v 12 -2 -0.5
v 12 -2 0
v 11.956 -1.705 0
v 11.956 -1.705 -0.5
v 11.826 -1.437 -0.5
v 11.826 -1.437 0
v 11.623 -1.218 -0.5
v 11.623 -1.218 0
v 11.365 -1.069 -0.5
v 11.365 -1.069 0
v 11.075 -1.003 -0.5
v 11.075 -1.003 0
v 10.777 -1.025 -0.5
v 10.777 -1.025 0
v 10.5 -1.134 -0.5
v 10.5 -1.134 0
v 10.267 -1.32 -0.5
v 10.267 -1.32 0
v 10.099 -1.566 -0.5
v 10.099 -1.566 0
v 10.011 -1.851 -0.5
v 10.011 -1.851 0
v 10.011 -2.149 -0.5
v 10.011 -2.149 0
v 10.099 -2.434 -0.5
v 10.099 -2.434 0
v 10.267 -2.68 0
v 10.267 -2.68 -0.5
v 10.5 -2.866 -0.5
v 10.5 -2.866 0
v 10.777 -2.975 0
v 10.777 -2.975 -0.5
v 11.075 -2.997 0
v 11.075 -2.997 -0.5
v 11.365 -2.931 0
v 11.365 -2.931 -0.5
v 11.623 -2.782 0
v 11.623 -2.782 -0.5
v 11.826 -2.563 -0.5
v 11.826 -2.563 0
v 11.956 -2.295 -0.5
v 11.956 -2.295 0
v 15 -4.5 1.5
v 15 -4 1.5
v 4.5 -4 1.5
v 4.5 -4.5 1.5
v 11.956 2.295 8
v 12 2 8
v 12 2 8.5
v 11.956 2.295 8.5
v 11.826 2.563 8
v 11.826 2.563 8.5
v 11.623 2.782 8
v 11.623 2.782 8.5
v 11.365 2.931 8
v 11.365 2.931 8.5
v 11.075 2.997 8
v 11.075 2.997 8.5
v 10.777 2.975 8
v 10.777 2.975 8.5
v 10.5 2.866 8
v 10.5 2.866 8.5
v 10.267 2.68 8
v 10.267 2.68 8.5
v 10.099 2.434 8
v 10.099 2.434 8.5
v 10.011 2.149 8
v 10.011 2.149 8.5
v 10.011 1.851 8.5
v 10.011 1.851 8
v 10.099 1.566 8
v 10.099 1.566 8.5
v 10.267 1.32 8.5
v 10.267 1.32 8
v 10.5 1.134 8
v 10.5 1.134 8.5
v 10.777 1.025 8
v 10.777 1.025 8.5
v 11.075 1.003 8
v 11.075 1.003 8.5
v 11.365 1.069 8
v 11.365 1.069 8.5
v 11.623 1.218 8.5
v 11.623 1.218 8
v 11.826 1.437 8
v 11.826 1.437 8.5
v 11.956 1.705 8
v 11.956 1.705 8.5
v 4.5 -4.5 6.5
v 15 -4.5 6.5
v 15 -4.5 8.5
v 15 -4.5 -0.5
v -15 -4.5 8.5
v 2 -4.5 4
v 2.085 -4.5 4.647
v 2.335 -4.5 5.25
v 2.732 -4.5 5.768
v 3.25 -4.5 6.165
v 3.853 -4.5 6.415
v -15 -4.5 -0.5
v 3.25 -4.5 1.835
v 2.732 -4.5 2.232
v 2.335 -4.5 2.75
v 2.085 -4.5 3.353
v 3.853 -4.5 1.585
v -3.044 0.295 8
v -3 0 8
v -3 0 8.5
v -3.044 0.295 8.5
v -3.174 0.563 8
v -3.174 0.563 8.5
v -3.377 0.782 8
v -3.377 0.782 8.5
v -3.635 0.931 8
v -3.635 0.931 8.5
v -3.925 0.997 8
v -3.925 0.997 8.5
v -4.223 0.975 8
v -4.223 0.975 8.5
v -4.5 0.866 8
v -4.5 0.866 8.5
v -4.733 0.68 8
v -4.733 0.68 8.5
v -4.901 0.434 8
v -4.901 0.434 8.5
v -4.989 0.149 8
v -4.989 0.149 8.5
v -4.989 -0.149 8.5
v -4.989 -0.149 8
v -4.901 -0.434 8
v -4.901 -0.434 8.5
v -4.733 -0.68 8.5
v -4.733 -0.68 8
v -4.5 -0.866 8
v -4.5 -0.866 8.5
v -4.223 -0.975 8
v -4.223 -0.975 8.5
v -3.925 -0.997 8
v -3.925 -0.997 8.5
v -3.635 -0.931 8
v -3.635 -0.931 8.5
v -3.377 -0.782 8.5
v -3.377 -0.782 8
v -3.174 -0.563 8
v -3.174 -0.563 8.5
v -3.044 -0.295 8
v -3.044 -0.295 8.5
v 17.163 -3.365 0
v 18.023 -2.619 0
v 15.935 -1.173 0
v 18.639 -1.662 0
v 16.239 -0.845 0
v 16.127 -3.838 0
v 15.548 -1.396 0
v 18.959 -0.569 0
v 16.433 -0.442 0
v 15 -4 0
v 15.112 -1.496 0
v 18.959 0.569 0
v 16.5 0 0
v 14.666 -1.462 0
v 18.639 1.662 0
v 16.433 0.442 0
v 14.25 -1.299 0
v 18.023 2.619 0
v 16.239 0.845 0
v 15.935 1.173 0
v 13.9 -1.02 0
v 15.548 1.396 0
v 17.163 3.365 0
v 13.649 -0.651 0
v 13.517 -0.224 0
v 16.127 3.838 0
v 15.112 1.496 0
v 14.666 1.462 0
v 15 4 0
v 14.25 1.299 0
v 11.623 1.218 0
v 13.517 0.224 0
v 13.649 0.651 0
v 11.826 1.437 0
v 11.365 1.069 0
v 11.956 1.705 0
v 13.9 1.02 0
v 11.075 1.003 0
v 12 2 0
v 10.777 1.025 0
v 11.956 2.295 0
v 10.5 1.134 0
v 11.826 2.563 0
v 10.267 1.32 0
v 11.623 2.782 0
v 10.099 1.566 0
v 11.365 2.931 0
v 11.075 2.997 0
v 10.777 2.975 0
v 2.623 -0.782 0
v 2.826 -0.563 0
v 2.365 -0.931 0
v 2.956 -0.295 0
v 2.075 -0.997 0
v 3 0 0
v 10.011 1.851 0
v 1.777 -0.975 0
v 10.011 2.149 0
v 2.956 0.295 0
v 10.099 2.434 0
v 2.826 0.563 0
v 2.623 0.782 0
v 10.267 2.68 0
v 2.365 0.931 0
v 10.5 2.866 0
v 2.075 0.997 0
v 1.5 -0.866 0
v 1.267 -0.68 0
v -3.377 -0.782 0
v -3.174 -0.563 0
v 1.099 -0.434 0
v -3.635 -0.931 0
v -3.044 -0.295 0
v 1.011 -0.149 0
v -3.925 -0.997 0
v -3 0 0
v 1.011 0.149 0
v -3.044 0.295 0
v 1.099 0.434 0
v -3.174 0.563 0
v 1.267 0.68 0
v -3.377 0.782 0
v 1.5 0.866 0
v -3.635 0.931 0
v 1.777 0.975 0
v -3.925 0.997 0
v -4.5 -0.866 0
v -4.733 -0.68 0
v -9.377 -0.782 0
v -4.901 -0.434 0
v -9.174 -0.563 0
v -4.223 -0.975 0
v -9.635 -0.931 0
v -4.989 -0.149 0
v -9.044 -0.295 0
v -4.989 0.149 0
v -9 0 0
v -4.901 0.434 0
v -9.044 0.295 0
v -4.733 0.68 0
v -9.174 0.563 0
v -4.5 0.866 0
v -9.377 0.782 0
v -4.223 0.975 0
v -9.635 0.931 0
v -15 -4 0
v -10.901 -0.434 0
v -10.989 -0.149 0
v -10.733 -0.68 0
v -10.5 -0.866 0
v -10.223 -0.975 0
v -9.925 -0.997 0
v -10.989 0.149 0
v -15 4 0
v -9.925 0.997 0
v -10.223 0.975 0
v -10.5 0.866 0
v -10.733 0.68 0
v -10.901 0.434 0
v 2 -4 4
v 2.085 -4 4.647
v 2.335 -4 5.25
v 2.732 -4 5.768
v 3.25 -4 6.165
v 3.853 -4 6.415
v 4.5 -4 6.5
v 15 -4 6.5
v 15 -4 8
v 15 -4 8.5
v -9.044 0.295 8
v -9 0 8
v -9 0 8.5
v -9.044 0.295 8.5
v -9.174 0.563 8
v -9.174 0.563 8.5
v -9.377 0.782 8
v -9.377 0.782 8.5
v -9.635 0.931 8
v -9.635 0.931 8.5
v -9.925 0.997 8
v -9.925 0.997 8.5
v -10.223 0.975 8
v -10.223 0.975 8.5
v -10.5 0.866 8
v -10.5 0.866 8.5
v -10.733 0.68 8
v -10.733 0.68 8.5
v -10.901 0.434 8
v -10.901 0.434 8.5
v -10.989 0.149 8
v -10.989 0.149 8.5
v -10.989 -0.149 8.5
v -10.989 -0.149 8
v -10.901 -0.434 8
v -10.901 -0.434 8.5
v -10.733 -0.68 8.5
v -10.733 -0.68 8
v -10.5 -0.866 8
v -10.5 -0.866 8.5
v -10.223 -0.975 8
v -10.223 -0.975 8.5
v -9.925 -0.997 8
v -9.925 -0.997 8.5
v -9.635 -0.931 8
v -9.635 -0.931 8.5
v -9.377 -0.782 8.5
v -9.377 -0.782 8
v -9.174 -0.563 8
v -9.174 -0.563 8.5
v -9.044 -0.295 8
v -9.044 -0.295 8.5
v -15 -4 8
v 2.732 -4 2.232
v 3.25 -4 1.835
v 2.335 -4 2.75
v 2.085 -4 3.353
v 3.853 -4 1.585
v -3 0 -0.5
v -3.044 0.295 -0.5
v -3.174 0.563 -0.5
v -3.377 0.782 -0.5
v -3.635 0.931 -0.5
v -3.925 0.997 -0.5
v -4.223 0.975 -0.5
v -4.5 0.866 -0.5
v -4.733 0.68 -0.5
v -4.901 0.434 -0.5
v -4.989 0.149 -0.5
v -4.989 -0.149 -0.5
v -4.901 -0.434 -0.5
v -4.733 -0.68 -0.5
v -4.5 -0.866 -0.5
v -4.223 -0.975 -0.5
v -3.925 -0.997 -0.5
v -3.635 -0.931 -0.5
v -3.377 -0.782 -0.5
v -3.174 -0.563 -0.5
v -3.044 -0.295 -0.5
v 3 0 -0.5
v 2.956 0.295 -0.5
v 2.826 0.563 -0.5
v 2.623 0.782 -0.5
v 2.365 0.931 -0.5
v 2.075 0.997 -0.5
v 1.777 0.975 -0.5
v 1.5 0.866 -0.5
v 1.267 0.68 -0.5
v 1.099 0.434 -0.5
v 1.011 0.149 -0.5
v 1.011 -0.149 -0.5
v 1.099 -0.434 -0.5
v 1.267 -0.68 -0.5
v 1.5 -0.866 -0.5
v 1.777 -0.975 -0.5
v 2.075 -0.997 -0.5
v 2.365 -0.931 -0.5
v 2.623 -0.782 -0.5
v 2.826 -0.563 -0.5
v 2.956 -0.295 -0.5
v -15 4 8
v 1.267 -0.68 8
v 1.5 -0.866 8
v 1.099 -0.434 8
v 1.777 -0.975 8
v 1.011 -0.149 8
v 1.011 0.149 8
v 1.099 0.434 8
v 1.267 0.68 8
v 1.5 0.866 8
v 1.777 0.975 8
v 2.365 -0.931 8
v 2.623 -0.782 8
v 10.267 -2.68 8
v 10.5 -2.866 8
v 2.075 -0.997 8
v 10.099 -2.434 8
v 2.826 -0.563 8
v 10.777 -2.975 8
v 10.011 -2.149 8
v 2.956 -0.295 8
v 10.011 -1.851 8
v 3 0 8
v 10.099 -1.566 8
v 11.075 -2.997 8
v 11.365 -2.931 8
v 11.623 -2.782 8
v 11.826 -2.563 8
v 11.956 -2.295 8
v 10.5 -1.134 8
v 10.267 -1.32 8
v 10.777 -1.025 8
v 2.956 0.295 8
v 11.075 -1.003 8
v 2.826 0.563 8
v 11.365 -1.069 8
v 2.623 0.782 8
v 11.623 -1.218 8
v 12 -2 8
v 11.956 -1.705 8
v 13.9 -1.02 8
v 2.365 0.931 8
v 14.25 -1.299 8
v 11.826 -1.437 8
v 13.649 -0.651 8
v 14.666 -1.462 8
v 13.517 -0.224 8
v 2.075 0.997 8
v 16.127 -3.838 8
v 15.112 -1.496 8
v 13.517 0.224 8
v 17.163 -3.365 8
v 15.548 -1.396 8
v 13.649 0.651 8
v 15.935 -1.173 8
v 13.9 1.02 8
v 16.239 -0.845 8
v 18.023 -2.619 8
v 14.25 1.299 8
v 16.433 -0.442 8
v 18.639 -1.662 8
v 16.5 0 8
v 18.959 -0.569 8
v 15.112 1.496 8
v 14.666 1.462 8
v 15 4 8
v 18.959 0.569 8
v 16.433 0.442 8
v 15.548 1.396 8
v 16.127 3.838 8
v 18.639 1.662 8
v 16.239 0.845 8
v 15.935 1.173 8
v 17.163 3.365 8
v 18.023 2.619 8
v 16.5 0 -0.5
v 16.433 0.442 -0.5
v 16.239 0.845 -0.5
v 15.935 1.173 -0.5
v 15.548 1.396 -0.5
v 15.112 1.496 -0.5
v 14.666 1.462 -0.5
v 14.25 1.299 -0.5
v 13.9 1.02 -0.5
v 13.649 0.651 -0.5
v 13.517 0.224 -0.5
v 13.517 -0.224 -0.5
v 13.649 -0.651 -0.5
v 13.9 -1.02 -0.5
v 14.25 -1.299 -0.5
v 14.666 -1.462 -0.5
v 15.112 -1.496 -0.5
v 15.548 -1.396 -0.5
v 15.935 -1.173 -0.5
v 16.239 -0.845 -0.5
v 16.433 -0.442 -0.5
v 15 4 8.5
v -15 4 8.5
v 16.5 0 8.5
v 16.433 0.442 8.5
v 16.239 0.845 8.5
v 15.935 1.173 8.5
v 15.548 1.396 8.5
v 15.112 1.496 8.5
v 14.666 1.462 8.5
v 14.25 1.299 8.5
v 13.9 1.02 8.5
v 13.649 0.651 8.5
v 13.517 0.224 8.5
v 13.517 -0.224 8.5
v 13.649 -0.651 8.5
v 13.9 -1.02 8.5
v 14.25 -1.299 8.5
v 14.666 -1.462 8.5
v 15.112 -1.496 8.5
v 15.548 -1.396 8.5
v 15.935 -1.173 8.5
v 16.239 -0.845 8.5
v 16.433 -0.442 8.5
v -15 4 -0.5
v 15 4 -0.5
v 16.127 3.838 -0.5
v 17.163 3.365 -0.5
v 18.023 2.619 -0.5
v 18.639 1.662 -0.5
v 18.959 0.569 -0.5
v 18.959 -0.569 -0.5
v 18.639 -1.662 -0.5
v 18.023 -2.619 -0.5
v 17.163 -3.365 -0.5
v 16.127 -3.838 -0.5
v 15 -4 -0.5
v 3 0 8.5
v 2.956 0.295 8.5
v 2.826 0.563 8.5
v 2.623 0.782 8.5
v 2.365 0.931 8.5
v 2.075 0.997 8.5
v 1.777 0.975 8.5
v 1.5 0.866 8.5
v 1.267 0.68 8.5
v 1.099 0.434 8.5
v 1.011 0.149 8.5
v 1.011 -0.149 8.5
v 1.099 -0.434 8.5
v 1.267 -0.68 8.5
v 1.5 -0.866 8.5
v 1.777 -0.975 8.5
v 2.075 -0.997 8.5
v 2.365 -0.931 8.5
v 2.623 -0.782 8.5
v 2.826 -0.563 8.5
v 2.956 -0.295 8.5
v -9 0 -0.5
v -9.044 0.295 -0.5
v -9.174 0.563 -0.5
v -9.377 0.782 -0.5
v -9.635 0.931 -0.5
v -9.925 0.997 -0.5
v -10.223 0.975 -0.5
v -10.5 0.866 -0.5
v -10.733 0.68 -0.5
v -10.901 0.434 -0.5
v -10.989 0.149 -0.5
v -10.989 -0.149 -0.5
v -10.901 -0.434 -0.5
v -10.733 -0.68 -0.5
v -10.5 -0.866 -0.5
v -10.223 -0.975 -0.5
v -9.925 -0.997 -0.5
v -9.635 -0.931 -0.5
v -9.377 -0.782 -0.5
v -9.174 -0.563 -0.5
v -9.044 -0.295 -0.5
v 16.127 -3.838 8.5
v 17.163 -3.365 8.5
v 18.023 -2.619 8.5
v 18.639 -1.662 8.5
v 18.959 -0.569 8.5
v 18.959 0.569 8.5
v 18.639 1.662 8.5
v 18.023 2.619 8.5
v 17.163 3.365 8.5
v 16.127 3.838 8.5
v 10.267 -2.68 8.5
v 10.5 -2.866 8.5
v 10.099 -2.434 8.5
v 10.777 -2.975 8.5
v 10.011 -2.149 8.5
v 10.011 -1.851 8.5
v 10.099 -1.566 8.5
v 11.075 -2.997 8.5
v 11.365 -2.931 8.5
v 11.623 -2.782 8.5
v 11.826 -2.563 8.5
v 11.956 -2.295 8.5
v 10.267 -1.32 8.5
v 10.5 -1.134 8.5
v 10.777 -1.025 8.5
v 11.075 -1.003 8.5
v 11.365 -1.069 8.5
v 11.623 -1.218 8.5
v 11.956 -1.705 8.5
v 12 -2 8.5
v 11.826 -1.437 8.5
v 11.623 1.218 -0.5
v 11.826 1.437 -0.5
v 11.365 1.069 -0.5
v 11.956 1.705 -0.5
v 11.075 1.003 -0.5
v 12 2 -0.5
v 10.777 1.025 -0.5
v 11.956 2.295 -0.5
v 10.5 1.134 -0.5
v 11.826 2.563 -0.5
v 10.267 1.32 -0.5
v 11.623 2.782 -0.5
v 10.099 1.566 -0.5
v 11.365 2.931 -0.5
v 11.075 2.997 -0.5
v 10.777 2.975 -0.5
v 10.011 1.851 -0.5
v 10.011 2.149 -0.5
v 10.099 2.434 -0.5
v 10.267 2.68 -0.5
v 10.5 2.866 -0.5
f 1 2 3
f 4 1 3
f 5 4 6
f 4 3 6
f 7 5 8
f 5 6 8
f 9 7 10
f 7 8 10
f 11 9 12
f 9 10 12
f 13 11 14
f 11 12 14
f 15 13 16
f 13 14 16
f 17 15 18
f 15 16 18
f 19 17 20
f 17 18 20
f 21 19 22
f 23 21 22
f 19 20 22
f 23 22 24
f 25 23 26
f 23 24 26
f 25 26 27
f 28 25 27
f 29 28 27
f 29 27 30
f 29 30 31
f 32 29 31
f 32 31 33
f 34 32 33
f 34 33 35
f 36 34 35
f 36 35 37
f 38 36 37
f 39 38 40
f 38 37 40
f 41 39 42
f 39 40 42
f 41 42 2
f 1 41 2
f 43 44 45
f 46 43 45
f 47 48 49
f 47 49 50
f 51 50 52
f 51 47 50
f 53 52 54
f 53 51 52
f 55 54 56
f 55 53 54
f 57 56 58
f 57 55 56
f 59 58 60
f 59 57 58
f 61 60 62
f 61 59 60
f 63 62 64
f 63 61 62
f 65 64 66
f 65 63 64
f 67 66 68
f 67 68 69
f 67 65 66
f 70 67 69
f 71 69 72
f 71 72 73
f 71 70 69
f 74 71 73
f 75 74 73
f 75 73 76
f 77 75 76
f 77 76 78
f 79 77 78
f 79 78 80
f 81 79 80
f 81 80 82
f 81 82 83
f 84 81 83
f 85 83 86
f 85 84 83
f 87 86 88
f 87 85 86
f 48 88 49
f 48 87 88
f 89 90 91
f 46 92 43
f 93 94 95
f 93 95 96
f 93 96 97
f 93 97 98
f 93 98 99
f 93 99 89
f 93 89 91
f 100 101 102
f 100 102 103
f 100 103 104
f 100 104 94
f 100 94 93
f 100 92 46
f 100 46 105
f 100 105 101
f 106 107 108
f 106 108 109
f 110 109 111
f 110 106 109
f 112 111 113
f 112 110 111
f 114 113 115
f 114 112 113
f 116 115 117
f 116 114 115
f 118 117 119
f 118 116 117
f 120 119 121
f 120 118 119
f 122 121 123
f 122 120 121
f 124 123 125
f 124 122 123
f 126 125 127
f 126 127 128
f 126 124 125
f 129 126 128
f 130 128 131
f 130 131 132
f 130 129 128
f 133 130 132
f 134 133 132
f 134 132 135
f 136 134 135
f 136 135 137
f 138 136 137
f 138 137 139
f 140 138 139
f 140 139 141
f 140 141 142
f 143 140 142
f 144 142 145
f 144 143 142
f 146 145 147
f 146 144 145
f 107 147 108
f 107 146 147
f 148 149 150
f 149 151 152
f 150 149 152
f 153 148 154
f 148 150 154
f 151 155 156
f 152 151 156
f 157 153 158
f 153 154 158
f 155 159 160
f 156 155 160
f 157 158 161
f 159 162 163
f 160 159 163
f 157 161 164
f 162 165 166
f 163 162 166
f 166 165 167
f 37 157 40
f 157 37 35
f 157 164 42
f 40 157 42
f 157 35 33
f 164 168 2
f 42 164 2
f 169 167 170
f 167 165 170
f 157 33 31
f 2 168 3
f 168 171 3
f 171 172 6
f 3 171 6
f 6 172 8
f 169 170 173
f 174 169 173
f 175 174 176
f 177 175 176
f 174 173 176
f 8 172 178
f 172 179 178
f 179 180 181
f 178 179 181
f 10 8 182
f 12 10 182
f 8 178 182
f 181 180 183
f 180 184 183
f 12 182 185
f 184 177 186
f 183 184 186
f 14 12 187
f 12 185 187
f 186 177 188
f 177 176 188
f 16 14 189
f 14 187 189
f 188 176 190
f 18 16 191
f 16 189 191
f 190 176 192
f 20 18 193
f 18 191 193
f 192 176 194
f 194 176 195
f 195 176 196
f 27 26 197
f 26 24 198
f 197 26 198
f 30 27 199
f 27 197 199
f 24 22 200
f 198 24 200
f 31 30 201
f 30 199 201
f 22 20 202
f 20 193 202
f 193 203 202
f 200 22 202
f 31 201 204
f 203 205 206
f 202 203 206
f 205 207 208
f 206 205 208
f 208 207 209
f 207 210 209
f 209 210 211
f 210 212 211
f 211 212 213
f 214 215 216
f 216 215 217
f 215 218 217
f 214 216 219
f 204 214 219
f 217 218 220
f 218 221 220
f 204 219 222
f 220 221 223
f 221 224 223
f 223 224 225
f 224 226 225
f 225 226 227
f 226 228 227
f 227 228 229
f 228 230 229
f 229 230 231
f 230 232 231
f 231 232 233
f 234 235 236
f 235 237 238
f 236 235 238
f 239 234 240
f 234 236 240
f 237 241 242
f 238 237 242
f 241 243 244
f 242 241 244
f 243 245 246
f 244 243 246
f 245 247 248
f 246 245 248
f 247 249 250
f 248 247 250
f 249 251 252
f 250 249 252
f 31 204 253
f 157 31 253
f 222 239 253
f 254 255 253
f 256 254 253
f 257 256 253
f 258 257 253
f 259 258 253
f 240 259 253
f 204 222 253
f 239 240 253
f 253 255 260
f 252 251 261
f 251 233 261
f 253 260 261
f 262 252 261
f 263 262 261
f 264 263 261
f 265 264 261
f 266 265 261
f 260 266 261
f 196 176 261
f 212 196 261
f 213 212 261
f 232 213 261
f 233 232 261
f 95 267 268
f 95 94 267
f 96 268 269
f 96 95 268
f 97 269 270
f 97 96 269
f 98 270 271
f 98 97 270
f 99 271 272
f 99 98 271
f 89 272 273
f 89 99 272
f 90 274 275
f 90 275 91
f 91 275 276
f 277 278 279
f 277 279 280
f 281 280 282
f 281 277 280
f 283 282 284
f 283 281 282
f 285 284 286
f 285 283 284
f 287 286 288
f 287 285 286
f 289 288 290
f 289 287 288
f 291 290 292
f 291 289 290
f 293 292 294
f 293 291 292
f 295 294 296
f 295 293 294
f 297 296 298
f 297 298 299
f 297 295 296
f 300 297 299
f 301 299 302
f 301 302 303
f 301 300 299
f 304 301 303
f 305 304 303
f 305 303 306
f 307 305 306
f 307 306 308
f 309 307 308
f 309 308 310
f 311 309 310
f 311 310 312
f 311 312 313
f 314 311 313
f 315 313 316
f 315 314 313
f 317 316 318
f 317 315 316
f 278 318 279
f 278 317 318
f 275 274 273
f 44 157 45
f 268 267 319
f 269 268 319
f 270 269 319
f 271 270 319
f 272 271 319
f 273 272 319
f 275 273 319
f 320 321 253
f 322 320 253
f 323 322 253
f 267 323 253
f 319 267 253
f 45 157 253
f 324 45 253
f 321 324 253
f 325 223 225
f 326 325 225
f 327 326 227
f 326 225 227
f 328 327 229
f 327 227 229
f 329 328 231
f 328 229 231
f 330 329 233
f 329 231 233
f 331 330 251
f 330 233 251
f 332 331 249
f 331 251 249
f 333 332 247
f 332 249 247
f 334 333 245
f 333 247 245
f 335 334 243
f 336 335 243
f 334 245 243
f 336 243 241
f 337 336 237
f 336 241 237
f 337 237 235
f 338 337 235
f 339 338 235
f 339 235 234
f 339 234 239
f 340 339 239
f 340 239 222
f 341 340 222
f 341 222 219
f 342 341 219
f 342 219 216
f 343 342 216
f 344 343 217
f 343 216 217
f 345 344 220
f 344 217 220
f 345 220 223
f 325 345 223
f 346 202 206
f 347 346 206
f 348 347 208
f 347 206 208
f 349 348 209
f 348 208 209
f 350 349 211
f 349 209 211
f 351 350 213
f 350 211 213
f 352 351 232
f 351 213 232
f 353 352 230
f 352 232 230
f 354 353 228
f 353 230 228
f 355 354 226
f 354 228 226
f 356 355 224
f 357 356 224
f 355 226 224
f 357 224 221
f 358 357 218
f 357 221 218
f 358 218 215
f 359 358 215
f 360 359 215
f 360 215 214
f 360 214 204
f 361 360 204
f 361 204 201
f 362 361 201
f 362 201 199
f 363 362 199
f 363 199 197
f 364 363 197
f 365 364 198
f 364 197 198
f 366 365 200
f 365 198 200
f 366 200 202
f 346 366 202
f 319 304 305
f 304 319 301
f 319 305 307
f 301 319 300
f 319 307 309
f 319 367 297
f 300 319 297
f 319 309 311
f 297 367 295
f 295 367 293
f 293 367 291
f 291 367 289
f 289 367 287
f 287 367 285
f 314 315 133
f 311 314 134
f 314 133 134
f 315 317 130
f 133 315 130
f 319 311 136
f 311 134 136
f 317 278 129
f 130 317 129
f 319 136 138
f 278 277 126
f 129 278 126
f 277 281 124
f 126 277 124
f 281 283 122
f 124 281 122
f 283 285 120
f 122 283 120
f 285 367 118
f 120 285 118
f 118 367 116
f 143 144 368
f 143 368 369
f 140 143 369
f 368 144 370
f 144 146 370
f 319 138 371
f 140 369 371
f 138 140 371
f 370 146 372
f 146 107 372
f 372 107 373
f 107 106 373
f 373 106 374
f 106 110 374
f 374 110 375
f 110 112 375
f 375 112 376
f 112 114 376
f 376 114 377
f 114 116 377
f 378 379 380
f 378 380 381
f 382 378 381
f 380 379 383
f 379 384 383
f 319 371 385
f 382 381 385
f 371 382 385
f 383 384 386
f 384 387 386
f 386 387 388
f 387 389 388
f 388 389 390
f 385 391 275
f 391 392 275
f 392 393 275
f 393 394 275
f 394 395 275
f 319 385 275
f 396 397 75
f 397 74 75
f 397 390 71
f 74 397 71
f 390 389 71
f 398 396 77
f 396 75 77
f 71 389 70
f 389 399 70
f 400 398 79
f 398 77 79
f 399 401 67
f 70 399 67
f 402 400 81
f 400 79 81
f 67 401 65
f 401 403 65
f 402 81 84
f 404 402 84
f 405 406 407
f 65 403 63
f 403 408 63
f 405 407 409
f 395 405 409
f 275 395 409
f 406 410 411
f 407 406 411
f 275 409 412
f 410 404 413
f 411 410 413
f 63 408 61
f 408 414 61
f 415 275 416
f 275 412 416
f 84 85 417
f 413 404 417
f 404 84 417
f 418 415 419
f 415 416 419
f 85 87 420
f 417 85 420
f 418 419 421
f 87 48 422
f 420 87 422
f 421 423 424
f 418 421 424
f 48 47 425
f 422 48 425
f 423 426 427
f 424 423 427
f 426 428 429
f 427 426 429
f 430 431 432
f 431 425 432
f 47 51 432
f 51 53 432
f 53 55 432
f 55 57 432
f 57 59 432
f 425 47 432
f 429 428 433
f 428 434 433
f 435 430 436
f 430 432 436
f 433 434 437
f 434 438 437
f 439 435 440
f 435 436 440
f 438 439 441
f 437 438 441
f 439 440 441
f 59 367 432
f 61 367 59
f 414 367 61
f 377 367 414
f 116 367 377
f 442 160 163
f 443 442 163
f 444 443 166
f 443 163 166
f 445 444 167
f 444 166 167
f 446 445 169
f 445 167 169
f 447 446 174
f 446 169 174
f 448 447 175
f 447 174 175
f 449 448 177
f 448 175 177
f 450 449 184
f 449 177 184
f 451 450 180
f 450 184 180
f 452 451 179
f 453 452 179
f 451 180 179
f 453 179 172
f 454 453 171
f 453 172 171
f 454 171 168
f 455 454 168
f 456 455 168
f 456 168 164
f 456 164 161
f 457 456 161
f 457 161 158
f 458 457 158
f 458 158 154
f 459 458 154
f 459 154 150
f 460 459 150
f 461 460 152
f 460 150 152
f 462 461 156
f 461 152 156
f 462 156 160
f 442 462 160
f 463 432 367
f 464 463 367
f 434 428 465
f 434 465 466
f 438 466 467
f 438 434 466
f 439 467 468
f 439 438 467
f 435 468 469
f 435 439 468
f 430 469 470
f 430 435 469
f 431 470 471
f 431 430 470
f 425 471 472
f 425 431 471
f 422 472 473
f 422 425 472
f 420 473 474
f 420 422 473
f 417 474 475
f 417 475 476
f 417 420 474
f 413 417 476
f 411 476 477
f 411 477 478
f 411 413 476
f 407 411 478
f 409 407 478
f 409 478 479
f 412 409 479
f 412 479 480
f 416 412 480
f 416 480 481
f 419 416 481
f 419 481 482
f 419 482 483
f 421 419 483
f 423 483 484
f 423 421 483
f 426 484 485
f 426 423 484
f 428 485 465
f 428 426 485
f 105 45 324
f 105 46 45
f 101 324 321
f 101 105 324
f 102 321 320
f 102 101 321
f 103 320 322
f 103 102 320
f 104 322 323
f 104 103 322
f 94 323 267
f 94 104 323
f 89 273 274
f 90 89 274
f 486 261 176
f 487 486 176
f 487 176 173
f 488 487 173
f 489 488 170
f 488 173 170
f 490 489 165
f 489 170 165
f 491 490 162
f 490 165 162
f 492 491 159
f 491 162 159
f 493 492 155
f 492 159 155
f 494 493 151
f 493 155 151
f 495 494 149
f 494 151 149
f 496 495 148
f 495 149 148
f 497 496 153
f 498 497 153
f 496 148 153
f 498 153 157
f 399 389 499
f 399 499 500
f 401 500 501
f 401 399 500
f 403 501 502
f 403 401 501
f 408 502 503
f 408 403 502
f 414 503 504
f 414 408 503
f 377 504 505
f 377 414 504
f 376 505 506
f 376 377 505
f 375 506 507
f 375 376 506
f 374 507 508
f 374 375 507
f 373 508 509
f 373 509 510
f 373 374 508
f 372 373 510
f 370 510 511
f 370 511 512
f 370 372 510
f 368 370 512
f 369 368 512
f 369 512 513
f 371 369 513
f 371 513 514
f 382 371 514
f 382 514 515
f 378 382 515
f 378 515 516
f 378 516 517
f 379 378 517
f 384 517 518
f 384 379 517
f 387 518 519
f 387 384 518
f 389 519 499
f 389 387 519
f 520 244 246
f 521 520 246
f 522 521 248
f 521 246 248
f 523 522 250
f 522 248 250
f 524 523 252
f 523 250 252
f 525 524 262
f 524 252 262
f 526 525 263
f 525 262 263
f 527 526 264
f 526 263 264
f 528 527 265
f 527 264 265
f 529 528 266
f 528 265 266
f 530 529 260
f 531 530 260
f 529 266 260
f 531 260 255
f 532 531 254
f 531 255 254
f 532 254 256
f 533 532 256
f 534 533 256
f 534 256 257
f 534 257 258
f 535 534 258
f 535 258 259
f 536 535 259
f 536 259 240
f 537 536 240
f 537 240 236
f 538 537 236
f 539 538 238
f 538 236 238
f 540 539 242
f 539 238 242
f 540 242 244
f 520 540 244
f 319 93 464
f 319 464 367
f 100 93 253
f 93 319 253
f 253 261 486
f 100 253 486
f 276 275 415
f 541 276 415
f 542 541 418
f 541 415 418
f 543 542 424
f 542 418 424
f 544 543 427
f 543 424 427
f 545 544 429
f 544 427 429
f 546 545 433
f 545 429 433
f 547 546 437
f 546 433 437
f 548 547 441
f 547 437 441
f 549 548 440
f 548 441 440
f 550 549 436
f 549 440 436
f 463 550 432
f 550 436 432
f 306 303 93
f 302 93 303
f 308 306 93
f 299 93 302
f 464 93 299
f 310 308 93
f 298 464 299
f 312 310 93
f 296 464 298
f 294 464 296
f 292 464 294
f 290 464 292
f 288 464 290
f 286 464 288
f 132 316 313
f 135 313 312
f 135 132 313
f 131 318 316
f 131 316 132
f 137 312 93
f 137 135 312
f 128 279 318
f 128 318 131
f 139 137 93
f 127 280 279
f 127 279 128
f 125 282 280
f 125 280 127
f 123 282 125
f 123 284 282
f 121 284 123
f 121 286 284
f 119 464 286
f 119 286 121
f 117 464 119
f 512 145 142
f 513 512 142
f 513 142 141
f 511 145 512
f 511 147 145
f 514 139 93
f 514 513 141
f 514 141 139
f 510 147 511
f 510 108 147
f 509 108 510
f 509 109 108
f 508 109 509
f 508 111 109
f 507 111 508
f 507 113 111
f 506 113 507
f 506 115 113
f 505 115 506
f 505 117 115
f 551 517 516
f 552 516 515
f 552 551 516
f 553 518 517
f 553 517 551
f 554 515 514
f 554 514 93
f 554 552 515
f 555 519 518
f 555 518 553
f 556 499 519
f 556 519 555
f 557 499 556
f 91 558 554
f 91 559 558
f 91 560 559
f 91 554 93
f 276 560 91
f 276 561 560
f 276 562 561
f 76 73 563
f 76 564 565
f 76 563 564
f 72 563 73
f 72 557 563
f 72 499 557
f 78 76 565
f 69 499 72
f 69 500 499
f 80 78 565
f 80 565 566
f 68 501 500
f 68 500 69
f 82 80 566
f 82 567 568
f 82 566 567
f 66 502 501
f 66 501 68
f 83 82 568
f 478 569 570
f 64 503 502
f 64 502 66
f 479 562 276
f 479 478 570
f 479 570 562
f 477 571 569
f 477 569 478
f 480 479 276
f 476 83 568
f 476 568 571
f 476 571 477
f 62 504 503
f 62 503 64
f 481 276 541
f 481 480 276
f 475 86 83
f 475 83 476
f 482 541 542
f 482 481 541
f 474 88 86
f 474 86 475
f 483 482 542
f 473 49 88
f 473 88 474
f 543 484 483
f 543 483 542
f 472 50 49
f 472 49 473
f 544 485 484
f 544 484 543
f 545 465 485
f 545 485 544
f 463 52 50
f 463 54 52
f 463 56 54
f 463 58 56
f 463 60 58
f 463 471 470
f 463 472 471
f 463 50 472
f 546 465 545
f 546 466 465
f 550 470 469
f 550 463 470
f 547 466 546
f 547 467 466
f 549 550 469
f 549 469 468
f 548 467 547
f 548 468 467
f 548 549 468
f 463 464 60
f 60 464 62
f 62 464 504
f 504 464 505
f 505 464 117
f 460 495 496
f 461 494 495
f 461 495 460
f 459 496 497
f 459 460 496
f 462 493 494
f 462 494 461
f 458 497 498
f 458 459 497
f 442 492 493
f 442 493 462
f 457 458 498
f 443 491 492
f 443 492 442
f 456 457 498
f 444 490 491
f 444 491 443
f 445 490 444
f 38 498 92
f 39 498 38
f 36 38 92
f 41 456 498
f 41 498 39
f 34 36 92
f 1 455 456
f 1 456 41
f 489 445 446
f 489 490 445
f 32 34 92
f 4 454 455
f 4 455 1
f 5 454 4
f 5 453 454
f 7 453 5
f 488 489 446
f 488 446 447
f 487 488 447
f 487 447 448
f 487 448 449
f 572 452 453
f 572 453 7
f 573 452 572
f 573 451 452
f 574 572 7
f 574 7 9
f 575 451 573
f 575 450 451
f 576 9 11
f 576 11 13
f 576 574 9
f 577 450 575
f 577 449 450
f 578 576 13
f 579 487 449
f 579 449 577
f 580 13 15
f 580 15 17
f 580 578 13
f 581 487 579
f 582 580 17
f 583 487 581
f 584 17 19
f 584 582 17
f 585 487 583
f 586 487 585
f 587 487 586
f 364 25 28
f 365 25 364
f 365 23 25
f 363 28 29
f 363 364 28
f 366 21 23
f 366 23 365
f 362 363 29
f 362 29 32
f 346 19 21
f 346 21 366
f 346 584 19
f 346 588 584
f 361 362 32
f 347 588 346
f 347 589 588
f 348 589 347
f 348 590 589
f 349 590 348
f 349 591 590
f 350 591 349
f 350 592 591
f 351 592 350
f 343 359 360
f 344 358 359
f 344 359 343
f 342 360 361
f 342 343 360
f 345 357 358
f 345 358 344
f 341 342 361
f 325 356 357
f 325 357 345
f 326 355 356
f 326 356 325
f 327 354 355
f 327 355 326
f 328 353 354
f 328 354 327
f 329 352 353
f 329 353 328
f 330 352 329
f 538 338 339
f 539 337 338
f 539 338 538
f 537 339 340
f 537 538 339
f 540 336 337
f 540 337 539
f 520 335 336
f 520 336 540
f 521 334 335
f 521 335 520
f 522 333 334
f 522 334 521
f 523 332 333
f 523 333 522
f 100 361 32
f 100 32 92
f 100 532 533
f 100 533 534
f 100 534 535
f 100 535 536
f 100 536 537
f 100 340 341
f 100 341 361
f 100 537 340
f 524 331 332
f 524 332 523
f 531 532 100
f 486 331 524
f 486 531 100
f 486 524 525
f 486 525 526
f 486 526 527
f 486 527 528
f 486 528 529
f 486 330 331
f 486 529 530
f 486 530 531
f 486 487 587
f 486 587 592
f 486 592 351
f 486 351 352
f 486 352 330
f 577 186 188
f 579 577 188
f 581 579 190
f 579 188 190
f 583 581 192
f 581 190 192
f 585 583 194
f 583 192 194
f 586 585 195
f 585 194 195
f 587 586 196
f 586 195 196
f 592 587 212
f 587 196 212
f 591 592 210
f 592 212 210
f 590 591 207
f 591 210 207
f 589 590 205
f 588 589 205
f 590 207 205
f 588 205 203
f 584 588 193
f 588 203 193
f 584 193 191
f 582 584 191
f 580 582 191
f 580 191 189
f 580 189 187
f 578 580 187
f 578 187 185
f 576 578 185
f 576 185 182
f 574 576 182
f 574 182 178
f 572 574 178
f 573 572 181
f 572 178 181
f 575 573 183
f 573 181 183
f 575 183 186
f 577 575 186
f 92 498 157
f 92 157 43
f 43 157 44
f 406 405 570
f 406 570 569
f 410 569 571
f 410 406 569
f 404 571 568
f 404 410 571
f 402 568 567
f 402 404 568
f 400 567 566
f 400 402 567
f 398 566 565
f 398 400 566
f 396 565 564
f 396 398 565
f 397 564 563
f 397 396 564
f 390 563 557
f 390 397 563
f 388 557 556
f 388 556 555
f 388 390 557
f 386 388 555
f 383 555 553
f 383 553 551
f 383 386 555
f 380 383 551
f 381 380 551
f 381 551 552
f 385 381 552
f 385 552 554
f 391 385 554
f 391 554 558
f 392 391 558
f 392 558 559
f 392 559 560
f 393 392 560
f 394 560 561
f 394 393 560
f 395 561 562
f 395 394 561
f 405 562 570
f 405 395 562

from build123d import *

# Parameters (mm, degrees)
SKETCH_2_R      = 1.5
SKETCH_2_R_2    = 1
EXTRUDE_1_DEPTH = 0.5
SKETCH_1_R      = 1.5
SKETCH_1_R_2    = 1
EXTRUDE_2_DEPTH = 0.5
EXTRUDE_4_DEPTH = 0.5
FILLET_1_R      = 2.5


with BuildPart() as part:
    # 草图2 → 凸台-拉伸1 (new body)
    with BuildSketch(Plane.XY.offset(8)):
        with BuildLine():
            Line((15, 4), (-15, 4))
            Line((-15, 4), (-15, -4))
            Line((-15, -4), (15, -4))
            ThreePointArc((15, -4), (19, 0), (15, 4))
        make_face()
        with Locations((15, 0)):
            Circle(SKETCH_2_R, mode=Mode.SUBTRACT)
        with Locations((11, -2)):
            Circle(SKETCH_2_R_2, mode=Mode.SUBTRACT)
        with Locations((11, 2)):
            Circle(SKETCH_2_R_2, mode=Mode.SUBTRACT)
        with Locations((2, 0)):
            Circle(SKETCH_2_R_2, mode=Mode.SUBTRACT)
        with Locations((-4, 0)):
            Circle(SKETCH_2_R_2, mode=Mode.SUBTRACT)
        with Locations((-10, 0)):
            Circle(SKETCH_2_R_2, mode=Mode.SUBTRACT)
    extrude(amount=EXTRUDE_1_DEPTH)



with BuildPart() as body_2:
    # 草图1 → 凸台-拉伸2 (new body)
    with BuildSketch(Plane.XY):
        with BuildLine():
            Line((-15, 4), (15, 4))
            ThreePointArc((15, 4), (19, 0), (15, -4))
            Line((15, -4), (-15, -4))
            Line((-15, -4), (-15, 4))
        make_face()
        with Locations((15, 0)):
            Circle(SKETCH_1_R, mode=Mode.SUBTRACT)
        with Locations((-10, 0)):
            Circle(SKETCH_1_R_2, mode=Mode.SUBTRACT)
        with Locations((-4, 0)):
            Circle(SKETCH_1_R_2, mode=Mode.SUBTRACT)
        with Locations((2, 0)):
            Circle(SKETCH_1_R_2, mode=Mode.SUBTRACT)
        with Locations((11, 2)):
            Circle(SKETCH_1_R_2, mode=Mode.SUBTRACT)
        with Locations((11, -2)):
            Circle(SKETCH_1_R_2, mode=Mode.SUBTRACT)
    extrude(amount=-EXTRUDE_2_DEPTH)


with BuildPart() as part_1:
    add(part.part)

    add(body_2.part)  # 凸台-拉伸4 merges body 2
    # 草图4 → 凸台-拉伸4 (add)
    with BuildSketch(Plane(origin=(0, -4, 0), x_dir=(1, 0, 0), z_dir=(0, 1, 0))):
        Polygon((-15, 0.5), (2, 0.5), (15, 0.5), (15, -1.5), (2, -1.5), (2, -6.5), (15, -6.5), (15, -8.5), (2, -8.5), (-15, -8.5), align=None)
    extrude(amount=-EXTRUDE_4_DEPTH)

    # 圆角1
    fillet_1_edges = [part_1.edges().sort_by_distance(p)[0] for p in [
        (2, -4.25, 1.5),
        (2, -4.25, 6.5),
    ]]
    fillet(fillet_1_edges, radius=FILLET_1_R - 0.0001)  # a hair under: the kernel refuses the full size


solid = part_1.part
